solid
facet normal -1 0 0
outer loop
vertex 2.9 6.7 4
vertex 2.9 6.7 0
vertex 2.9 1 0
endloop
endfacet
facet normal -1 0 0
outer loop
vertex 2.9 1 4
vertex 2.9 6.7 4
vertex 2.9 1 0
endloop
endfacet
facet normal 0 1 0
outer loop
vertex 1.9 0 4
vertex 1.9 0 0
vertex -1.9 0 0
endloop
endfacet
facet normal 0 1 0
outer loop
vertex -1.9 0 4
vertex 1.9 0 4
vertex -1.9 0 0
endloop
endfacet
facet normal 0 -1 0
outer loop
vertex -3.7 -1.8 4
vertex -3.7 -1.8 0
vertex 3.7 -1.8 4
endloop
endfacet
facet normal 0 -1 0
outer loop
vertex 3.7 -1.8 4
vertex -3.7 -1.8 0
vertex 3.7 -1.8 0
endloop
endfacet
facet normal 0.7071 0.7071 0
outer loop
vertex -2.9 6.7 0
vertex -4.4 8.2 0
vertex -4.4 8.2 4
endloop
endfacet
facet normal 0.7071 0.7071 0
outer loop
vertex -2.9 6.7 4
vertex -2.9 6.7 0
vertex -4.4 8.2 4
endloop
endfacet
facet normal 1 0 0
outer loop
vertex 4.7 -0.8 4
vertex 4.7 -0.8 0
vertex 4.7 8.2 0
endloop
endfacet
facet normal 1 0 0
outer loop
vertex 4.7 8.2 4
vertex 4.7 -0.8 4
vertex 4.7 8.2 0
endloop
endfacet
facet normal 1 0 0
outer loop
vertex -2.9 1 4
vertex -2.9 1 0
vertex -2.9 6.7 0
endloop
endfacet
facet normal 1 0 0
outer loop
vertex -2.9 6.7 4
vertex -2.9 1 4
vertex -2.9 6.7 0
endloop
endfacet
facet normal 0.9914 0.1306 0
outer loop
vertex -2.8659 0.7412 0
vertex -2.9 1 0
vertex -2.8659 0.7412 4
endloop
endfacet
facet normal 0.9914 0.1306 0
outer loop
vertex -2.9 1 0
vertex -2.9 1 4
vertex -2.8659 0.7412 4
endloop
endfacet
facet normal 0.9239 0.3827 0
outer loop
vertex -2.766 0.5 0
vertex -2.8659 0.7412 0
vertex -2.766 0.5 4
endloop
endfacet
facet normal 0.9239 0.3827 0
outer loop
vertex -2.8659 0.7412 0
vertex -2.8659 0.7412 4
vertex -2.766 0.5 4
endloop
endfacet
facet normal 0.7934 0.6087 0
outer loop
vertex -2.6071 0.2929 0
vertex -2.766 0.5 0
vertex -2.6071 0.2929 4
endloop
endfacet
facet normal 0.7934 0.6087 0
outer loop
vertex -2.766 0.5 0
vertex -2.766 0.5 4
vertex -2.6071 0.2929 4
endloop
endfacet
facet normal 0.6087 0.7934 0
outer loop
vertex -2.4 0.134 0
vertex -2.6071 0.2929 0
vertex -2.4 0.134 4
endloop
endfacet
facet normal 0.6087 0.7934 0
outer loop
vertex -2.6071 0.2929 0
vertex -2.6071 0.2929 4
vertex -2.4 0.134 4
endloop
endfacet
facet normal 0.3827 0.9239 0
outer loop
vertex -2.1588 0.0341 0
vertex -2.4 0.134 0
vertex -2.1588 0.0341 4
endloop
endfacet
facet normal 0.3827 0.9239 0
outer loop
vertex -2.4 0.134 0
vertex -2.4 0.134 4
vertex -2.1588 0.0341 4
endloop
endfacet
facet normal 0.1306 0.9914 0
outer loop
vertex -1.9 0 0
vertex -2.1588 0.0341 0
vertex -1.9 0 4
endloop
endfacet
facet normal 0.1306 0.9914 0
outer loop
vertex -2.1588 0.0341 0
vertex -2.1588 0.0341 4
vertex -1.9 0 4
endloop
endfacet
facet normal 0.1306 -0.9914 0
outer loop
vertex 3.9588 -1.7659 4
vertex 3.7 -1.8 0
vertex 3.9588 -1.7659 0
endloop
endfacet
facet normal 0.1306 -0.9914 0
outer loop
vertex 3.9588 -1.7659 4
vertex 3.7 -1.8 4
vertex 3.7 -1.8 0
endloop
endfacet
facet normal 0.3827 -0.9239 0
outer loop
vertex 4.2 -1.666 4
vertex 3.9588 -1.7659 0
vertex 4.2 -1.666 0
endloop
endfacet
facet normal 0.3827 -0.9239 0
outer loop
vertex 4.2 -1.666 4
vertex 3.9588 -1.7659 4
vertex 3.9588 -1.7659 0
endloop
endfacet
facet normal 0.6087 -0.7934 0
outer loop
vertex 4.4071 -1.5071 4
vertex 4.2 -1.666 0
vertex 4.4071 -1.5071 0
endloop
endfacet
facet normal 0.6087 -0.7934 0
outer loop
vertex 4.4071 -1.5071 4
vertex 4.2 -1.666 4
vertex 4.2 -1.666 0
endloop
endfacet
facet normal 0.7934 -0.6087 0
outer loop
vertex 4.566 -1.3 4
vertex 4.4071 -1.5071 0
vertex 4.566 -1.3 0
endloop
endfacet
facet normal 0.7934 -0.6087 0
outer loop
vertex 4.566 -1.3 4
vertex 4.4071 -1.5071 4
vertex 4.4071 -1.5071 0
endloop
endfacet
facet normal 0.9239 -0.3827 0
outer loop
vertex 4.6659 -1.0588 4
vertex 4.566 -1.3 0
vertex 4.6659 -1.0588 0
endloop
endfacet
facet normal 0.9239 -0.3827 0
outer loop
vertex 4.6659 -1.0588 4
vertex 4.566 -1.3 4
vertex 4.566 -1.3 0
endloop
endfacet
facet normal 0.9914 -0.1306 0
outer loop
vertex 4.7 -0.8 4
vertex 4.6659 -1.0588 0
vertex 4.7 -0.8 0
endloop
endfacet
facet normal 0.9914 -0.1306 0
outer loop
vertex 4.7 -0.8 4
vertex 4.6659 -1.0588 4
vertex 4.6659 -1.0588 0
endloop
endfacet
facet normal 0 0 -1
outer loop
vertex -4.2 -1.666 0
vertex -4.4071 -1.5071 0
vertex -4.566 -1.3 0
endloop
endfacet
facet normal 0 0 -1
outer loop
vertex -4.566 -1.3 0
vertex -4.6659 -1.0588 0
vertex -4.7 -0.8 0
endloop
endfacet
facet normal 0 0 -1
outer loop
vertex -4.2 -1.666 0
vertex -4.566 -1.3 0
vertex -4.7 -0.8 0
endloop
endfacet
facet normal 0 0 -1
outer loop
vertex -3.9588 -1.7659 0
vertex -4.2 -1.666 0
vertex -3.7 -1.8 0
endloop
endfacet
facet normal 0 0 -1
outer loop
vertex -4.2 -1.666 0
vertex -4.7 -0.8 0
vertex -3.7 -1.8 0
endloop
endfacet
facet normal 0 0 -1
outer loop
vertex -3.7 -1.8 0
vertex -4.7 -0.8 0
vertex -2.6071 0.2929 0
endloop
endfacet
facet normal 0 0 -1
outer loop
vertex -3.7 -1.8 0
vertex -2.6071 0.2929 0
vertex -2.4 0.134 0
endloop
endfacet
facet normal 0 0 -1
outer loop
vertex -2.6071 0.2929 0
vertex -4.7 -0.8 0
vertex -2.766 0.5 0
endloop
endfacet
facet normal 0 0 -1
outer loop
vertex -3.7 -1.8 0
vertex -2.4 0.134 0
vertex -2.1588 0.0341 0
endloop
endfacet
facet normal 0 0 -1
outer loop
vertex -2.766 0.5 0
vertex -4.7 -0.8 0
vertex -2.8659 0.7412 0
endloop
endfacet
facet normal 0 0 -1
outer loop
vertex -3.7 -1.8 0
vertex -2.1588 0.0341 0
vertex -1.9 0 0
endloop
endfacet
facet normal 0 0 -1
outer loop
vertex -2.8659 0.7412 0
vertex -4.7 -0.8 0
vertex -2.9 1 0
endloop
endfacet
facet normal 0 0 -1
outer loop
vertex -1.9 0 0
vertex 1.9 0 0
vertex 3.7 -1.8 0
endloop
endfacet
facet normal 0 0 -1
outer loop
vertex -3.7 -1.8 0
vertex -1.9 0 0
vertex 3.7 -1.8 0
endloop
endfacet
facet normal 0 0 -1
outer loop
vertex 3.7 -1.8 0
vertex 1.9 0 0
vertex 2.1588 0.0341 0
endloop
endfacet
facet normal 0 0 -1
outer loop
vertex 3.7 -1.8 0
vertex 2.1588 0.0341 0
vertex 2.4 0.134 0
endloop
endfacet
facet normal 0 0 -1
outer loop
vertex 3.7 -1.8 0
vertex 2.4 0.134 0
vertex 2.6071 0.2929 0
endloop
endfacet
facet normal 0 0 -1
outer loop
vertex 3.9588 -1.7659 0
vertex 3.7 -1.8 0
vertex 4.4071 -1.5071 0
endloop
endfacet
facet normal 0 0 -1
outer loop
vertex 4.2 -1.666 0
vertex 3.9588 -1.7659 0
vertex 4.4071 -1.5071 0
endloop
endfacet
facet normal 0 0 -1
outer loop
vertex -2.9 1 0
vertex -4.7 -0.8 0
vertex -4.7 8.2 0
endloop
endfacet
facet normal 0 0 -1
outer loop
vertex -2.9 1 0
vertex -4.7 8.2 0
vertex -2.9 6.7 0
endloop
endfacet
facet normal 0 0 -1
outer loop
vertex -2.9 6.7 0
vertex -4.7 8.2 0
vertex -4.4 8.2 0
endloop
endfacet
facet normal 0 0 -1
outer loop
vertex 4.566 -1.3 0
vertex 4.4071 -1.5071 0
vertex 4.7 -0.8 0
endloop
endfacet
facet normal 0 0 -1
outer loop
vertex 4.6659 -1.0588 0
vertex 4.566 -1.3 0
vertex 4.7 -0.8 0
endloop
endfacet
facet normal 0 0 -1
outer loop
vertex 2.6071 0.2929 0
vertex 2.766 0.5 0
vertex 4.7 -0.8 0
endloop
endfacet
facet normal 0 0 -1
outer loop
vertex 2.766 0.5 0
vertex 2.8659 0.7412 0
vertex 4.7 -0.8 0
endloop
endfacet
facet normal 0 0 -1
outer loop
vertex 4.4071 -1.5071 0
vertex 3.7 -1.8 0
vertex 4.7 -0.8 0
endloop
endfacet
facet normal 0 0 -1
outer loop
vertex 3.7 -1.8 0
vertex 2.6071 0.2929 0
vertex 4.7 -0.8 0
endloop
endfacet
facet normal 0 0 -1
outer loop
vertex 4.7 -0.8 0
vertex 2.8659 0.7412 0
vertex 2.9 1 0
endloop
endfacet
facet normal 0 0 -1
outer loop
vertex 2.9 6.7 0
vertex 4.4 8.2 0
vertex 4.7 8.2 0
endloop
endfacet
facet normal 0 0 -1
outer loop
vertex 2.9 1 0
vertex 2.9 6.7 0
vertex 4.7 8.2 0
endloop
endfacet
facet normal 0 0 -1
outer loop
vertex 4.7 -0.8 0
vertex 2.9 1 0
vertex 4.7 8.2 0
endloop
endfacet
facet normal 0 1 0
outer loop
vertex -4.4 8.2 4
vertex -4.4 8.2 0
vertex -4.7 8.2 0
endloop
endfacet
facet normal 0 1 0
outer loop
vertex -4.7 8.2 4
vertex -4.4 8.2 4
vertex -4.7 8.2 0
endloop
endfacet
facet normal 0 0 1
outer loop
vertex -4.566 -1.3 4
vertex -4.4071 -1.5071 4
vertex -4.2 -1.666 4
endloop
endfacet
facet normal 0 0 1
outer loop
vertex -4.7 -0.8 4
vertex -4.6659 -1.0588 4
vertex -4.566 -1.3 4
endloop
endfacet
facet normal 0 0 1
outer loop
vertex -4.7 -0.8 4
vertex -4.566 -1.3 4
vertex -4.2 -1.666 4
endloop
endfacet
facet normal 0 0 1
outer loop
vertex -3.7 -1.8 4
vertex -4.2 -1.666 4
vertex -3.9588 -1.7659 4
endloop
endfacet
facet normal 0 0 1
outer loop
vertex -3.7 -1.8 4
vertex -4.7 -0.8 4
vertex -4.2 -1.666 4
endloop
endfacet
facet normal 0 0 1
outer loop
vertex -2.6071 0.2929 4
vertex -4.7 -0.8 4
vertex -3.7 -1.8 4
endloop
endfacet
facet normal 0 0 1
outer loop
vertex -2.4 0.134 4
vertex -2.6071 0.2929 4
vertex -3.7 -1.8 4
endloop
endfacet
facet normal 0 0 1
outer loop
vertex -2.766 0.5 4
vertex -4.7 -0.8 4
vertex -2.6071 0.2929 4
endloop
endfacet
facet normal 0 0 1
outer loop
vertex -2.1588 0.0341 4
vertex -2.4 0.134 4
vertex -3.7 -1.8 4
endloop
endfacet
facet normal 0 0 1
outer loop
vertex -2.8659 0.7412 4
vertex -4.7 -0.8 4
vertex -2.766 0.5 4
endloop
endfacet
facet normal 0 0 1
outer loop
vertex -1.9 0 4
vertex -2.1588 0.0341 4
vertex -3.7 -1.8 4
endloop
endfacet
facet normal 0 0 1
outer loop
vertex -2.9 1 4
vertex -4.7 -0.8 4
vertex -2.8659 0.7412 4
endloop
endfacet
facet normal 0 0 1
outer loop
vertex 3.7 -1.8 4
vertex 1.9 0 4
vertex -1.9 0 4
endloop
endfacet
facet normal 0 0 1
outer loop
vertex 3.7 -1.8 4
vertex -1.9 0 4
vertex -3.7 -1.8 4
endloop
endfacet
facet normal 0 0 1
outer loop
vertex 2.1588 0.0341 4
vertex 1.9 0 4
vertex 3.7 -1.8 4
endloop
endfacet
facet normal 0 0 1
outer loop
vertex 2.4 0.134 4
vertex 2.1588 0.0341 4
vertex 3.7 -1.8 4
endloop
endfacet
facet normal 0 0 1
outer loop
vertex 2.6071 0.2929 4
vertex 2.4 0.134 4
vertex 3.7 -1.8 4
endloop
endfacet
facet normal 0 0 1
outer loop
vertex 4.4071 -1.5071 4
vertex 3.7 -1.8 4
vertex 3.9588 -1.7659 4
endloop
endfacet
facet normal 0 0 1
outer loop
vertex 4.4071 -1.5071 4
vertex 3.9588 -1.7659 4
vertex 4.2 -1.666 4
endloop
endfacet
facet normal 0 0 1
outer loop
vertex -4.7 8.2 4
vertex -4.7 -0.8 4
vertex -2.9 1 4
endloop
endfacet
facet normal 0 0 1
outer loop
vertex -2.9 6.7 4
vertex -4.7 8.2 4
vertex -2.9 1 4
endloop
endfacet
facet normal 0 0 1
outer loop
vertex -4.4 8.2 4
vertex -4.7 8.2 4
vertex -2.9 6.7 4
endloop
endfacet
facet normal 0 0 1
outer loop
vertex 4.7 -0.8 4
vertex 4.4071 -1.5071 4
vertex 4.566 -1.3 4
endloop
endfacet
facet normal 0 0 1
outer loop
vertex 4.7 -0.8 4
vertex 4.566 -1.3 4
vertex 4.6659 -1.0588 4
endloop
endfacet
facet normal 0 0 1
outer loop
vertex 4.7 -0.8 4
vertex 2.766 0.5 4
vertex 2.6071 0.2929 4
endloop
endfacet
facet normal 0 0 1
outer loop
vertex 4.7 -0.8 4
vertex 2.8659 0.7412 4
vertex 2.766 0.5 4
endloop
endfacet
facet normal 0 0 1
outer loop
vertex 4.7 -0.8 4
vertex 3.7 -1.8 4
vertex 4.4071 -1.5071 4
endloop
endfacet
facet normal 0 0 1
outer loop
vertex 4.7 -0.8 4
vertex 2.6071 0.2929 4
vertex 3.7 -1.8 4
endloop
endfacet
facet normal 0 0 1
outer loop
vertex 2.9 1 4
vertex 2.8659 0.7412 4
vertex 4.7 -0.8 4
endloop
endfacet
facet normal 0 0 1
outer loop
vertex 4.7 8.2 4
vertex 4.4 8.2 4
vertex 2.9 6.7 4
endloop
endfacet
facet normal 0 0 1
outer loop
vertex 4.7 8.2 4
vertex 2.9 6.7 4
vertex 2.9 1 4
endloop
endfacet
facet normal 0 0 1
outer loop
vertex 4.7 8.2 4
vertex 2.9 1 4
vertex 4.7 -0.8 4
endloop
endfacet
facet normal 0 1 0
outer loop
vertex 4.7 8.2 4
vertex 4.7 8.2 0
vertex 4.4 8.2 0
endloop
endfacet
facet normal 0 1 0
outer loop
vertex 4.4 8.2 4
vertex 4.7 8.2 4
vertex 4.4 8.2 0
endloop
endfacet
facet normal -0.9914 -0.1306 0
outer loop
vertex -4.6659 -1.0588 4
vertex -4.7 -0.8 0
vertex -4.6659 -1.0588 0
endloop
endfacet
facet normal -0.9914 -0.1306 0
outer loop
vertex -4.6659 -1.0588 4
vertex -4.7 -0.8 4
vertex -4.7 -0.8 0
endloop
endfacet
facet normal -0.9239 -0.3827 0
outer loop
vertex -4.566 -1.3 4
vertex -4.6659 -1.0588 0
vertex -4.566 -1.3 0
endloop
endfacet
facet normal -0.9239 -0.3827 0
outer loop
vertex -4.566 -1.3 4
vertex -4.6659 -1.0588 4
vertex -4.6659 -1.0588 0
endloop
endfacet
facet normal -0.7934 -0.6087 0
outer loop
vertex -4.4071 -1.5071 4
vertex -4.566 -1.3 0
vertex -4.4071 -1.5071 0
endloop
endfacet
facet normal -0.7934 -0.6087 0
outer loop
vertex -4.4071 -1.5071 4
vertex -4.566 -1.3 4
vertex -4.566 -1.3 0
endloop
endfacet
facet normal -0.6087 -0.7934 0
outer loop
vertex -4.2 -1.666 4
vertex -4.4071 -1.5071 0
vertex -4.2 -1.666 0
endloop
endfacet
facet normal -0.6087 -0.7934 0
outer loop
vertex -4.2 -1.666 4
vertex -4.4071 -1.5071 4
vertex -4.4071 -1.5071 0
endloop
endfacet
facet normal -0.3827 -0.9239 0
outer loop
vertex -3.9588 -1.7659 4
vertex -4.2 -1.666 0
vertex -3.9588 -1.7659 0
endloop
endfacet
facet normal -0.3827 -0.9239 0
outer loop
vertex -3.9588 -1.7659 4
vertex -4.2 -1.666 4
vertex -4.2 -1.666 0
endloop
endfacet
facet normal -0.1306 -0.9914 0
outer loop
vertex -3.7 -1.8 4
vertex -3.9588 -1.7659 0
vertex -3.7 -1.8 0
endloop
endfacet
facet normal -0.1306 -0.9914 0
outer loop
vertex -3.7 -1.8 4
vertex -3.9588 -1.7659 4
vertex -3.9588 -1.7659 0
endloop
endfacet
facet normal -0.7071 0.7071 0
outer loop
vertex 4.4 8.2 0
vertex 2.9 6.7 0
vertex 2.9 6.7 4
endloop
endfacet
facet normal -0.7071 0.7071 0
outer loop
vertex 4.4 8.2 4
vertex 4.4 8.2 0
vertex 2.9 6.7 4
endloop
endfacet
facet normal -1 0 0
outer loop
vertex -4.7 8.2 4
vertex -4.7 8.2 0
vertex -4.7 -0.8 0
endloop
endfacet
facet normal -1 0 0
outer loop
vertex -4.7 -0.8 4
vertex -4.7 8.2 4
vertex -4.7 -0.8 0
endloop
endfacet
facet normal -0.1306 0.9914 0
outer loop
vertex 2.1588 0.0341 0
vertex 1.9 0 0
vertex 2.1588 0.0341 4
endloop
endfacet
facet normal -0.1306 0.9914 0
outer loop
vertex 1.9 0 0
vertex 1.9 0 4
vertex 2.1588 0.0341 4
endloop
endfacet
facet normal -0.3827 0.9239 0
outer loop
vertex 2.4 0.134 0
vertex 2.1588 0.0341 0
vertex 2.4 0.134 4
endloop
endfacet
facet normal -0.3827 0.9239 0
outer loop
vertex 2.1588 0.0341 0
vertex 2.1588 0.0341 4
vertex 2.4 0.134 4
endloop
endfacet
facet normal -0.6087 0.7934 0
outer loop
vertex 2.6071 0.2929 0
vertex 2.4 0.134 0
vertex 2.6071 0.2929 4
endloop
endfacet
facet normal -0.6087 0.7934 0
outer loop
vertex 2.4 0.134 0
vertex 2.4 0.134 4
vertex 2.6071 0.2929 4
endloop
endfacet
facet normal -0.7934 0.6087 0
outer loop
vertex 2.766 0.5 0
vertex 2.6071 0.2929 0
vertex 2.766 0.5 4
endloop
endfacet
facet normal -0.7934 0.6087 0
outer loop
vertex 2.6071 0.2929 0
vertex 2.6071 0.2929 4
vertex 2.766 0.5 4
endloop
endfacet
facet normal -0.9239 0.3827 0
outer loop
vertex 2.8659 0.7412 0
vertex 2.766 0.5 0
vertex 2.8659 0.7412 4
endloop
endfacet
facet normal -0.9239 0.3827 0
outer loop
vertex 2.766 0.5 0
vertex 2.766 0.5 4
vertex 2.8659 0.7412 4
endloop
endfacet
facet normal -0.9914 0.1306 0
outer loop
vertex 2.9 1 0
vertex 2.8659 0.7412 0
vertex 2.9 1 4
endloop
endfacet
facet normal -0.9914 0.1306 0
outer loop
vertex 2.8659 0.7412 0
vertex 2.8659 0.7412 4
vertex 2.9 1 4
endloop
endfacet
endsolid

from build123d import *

# Parameters (mm, degrees)
F1_DEPTH = 4
F2_SIZE  = 1.5
F3_R     = 1


with BuildPart() as f1:
    # F0 (on Top) → F1 (new body)
    with BuildSketch(Plane.XY):
        Polygon((-2.9, 0), (-2.9, 8.2), (-4.7, 8.2), (-4.7, -1.8), (4.7, -1.8), (4.7, 8.2), (2.9, 8.2), (2.9, 0), align=None)
    extrude(amount=F1_DEPTH)

    # F2
    f2_edges = [f1.edges().sort_by_distance(p)[0] for p in [
        (-2.9, 8.2, 2),
        (2.9, 8.2, 2),
    ]]
    chamfer(f2_edges, length=F2_SIZE)

    # F3
    f3_edges = [f1.edges().sort_by_distance(p)[0] for p in [
        (-2.9, 0, 2),
        (2.9, 0, 2),
        (-4.7, -1.8, 2),
        (4.7, -1.8, 2),
    ]]
    fillet(f3_edges, radius=F3_R)


solid = f1.part
